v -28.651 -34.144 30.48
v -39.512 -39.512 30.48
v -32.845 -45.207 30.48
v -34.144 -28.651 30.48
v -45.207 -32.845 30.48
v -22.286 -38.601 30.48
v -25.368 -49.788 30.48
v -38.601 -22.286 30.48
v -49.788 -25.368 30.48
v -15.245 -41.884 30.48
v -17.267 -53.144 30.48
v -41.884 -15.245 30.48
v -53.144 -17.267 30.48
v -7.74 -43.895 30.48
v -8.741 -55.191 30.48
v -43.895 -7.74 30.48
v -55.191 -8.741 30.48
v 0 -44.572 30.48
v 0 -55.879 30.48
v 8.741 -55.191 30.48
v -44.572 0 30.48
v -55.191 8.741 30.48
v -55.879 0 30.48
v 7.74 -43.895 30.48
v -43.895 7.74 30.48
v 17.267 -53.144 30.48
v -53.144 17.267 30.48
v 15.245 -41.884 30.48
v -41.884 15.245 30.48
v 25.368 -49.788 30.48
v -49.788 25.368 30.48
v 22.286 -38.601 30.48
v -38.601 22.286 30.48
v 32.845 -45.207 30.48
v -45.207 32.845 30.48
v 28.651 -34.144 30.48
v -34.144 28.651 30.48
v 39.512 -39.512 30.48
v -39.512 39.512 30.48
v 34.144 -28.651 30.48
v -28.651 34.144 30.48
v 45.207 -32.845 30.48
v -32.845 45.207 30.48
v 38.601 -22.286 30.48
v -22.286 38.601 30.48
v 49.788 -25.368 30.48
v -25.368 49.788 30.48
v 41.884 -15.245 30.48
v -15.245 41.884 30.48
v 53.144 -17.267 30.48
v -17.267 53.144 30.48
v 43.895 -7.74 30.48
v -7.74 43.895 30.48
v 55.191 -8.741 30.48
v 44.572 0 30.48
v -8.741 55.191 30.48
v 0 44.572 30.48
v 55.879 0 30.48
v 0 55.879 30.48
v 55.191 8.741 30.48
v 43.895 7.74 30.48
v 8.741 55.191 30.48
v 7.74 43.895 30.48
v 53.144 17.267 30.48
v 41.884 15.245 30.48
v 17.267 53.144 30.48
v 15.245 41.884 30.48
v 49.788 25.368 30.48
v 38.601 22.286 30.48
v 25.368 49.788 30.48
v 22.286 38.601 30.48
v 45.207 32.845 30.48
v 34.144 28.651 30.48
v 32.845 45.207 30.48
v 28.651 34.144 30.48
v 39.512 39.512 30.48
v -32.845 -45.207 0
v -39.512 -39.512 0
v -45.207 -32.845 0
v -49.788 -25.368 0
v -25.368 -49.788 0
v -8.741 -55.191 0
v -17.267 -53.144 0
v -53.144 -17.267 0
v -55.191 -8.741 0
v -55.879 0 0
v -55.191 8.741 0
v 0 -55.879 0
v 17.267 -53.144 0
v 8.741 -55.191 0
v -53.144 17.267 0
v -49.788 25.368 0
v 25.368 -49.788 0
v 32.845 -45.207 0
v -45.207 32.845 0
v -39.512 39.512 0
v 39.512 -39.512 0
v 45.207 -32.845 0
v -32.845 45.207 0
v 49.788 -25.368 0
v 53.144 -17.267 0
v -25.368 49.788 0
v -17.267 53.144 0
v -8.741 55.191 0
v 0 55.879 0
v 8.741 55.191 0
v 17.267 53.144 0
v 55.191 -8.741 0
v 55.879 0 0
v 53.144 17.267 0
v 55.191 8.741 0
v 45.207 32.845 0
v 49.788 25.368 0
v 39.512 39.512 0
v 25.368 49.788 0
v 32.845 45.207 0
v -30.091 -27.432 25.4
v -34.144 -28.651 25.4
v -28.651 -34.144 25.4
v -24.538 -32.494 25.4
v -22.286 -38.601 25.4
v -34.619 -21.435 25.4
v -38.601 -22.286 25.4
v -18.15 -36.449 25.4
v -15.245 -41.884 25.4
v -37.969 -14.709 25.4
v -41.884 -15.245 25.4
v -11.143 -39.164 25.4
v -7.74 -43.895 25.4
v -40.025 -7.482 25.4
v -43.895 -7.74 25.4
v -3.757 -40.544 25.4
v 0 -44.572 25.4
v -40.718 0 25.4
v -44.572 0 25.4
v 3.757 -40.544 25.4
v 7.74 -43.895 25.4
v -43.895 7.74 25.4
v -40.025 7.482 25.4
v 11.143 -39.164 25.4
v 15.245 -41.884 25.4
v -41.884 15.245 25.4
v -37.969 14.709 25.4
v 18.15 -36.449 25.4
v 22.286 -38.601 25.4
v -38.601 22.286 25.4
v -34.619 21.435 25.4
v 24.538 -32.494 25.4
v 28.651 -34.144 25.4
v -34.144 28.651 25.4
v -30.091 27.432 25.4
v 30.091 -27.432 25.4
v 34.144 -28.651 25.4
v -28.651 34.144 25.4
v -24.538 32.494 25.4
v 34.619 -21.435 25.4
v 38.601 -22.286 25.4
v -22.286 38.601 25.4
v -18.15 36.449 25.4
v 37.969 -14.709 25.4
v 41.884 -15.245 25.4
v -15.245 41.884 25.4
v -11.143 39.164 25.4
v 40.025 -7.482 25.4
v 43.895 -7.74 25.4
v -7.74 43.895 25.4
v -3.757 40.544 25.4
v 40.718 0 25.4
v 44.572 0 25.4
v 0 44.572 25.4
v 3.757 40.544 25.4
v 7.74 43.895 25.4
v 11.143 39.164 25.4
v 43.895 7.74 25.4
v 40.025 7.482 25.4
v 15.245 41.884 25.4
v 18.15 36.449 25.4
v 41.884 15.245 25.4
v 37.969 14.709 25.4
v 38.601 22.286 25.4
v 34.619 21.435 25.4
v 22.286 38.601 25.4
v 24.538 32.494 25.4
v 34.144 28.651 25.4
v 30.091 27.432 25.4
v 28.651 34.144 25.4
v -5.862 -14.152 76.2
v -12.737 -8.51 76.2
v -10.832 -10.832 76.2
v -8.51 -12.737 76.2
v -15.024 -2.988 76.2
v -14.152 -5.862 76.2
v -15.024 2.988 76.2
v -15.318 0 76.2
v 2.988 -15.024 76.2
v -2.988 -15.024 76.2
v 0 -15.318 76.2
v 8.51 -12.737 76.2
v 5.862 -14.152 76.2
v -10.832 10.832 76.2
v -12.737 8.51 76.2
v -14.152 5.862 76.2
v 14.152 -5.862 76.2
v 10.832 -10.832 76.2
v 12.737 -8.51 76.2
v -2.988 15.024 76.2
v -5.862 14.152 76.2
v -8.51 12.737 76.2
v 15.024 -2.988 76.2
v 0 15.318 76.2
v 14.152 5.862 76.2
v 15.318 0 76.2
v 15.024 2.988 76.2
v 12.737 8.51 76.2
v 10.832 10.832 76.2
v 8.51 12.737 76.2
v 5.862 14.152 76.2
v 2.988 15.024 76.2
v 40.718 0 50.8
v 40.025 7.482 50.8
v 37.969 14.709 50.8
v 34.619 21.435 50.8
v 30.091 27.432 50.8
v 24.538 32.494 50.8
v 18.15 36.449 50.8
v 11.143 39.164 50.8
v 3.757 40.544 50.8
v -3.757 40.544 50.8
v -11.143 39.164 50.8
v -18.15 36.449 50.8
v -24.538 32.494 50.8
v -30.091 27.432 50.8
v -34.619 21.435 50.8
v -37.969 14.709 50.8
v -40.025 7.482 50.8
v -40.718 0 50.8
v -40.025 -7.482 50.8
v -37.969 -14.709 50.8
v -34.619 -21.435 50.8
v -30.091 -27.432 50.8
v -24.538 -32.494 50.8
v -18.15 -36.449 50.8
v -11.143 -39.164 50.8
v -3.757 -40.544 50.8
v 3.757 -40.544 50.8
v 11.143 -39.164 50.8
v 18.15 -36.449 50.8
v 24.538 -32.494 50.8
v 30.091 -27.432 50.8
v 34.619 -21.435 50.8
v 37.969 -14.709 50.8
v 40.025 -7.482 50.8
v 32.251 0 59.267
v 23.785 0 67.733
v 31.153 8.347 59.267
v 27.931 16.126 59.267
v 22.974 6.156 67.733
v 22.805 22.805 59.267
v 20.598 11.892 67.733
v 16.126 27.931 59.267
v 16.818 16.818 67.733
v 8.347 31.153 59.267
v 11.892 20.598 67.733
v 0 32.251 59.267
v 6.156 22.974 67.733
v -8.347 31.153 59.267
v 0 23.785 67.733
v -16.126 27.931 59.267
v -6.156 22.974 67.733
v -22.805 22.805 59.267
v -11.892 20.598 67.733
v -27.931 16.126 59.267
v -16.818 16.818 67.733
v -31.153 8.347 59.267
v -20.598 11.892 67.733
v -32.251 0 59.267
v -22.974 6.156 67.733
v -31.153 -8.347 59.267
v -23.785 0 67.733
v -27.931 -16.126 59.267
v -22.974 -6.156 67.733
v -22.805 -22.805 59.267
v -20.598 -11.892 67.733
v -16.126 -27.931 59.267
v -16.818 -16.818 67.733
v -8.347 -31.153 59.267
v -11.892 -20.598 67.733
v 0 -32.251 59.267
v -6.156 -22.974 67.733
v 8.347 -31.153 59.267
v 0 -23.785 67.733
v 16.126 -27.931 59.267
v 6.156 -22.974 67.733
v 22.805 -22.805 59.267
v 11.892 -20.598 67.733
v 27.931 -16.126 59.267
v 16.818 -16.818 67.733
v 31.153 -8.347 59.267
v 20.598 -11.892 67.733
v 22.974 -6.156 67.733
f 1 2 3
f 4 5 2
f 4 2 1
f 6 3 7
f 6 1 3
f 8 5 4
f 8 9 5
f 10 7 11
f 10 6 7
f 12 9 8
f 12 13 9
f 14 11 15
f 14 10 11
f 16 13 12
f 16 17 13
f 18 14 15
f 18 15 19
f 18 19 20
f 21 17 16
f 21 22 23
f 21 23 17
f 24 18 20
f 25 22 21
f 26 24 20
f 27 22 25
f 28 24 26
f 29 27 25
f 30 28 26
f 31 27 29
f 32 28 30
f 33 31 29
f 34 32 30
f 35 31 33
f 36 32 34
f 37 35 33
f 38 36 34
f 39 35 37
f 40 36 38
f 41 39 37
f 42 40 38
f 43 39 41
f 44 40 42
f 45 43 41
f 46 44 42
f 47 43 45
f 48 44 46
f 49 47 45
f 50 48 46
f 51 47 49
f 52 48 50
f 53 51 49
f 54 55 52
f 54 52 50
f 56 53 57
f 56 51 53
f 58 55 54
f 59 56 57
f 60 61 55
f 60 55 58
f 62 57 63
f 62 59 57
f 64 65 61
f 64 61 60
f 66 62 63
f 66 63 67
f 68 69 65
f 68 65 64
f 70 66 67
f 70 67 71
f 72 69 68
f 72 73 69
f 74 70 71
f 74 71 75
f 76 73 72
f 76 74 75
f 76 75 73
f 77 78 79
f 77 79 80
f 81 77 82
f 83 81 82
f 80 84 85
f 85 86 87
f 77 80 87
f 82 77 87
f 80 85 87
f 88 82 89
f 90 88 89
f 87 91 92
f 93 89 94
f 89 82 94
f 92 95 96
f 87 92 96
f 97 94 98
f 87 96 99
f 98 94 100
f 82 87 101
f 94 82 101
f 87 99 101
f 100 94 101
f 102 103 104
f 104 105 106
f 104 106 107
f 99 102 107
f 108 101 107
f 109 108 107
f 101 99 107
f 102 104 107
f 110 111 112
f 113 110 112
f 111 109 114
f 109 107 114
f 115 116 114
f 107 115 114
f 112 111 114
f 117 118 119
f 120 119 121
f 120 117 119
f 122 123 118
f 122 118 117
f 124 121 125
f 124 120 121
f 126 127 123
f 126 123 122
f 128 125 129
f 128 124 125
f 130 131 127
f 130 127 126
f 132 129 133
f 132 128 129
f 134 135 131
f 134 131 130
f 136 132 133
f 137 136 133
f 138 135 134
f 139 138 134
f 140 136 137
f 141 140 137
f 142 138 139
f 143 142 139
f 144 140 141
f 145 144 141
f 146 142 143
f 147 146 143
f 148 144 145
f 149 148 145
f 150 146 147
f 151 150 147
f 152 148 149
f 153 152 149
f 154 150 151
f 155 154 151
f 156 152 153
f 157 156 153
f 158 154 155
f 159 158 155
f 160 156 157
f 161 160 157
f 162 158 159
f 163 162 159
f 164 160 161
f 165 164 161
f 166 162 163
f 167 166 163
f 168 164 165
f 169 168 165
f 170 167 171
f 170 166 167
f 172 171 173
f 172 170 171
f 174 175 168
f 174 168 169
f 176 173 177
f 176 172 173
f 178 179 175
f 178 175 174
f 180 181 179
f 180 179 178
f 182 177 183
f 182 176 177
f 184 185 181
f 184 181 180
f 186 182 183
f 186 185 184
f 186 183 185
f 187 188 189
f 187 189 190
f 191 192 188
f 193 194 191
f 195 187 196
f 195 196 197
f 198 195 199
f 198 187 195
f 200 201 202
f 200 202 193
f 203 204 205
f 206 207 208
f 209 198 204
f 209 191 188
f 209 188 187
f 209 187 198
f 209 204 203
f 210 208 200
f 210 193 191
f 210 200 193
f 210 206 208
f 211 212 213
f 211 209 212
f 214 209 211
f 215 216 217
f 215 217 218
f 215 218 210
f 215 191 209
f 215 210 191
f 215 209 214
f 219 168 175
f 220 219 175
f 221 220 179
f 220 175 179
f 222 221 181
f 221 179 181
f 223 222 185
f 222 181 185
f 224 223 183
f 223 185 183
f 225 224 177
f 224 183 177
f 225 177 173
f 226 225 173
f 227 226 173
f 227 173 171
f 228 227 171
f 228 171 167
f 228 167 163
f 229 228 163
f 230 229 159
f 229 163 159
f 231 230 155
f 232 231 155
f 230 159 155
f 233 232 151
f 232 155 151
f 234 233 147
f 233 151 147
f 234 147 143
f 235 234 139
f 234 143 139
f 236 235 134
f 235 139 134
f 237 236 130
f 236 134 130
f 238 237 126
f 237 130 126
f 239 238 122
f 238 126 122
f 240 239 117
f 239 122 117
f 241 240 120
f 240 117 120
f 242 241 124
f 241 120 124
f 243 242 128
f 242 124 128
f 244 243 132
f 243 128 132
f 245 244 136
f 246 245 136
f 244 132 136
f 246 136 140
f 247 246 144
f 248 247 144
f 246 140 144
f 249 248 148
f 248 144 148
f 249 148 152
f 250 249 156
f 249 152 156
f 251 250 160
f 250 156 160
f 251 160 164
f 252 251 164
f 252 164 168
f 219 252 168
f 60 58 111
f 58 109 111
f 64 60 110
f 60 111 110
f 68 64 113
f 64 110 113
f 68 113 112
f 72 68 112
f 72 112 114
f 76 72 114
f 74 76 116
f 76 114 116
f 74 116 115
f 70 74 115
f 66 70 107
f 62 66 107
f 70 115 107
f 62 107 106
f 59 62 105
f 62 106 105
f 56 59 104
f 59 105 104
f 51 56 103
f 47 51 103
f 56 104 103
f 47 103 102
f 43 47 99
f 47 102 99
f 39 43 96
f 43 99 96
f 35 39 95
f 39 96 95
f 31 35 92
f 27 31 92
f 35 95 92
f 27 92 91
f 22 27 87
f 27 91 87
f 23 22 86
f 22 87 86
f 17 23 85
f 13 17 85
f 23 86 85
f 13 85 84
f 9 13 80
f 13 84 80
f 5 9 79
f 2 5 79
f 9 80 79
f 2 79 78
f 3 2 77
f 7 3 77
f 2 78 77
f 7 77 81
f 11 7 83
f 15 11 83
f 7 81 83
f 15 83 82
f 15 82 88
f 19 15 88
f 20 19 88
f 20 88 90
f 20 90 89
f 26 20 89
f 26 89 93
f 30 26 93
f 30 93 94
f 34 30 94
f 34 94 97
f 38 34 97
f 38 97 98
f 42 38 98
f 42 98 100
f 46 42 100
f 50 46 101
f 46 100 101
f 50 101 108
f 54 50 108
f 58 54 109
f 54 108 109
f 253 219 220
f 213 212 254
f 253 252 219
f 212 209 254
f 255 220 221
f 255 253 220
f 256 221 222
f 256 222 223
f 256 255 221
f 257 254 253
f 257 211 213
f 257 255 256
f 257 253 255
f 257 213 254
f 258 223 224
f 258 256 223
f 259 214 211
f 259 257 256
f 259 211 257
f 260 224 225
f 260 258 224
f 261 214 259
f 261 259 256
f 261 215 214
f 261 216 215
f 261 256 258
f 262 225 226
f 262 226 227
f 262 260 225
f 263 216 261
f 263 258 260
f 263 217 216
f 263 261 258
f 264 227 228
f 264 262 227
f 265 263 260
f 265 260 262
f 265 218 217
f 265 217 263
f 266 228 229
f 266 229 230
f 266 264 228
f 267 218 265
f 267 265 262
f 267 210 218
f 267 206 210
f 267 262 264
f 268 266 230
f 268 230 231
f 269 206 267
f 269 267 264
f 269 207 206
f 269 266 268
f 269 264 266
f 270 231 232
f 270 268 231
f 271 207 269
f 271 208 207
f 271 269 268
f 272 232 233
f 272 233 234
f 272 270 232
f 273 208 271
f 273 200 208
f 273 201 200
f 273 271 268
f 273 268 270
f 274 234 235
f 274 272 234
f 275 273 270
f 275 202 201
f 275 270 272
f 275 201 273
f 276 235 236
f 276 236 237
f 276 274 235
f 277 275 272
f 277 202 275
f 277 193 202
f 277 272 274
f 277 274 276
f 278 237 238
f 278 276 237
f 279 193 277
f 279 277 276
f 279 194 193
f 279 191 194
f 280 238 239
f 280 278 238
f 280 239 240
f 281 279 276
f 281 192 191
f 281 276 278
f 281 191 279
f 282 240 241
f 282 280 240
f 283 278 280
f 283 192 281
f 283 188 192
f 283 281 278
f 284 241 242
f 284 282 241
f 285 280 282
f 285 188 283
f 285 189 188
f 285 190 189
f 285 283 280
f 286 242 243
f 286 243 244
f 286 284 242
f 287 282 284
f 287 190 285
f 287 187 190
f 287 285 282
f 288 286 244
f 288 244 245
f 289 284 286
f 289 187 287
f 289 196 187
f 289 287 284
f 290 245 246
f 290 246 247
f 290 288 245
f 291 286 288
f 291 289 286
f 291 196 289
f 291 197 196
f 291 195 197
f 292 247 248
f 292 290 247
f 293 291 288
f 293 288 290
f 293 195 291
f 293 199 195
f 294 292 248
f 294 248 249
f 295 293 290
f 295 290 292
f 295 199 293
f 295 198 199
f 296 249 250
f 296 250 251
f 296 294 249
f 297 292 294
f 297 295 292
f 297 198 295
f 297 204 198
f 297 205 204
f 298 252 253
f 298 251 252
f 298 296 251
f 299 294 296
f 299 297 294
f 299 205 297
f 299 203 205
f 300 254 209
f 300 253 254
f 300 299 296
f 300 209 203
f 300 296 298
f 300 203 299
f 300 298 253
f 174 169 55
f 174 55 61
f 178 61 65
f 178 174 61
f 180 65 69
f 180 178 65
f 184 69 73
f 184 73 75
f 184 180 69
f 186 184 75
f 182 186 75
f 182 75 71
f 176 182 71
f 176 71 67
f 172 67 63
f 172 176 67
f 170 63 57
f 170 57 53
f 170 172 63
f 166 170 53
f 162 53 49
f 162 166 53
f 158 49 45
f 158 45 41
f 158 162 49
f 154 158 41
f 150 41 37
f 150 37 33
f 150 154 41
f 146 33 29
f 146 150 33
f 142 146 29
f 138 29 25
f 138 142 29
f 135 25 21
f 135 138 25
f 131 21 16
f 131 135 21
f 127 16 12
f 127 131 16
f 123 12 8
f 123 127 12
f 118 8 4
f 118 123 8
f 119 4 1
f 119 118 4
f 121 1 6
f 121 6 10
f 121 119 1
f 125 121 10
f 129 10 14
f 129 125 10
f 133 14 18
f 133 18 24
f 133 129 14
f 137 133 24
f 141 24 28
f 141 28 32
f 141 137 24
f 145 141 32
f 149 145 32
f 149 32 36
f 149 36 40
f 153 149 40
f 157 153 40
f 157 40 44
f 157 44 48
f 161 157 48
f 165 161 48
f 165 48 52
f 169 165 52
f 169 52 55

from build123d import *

# Parameters (mm, degrees)
F0_R     = 55.878633
F1_DEPTH = 25.4
F2_R     = 55.878633
F2_R_2   = 44.572454
F4_DEPTH = 5.08
F3_R     = 40.718118
F5_DEPTH = 50.8
F6_SIZE  = 25.4


with BuildPart() as f1:
    # F0 (on Top) → F1 (new body)
    with BuildSketch(Plane.XY):
        Circle(F0_R)
    extrude(amount=F1_DEPTH)

    # F2 (on face) → F4 (join)
    with BuildSketch(Plane.XY.offset(25.4)):
        Circle(F2_R)
        Circle(F2_R_2, mode=Mode.SUBTRACT)
    extrude(amount=F4_DEPTH)

    # F3 (on face) → F5 (join)
    with BuildSketch(Plane.XY.offset(25.4)):
        Circle(F3_R)
    extrude(amount=F5_DEPTH)

    # F6
    f6_edges = [f1.edges().sort_by_distance(p)[0] for p in [
        (-40.718118, 0, 76.2),
    ]]
    chamfer(f6_edges, length=F6_SIZE)


solid = f1.part
